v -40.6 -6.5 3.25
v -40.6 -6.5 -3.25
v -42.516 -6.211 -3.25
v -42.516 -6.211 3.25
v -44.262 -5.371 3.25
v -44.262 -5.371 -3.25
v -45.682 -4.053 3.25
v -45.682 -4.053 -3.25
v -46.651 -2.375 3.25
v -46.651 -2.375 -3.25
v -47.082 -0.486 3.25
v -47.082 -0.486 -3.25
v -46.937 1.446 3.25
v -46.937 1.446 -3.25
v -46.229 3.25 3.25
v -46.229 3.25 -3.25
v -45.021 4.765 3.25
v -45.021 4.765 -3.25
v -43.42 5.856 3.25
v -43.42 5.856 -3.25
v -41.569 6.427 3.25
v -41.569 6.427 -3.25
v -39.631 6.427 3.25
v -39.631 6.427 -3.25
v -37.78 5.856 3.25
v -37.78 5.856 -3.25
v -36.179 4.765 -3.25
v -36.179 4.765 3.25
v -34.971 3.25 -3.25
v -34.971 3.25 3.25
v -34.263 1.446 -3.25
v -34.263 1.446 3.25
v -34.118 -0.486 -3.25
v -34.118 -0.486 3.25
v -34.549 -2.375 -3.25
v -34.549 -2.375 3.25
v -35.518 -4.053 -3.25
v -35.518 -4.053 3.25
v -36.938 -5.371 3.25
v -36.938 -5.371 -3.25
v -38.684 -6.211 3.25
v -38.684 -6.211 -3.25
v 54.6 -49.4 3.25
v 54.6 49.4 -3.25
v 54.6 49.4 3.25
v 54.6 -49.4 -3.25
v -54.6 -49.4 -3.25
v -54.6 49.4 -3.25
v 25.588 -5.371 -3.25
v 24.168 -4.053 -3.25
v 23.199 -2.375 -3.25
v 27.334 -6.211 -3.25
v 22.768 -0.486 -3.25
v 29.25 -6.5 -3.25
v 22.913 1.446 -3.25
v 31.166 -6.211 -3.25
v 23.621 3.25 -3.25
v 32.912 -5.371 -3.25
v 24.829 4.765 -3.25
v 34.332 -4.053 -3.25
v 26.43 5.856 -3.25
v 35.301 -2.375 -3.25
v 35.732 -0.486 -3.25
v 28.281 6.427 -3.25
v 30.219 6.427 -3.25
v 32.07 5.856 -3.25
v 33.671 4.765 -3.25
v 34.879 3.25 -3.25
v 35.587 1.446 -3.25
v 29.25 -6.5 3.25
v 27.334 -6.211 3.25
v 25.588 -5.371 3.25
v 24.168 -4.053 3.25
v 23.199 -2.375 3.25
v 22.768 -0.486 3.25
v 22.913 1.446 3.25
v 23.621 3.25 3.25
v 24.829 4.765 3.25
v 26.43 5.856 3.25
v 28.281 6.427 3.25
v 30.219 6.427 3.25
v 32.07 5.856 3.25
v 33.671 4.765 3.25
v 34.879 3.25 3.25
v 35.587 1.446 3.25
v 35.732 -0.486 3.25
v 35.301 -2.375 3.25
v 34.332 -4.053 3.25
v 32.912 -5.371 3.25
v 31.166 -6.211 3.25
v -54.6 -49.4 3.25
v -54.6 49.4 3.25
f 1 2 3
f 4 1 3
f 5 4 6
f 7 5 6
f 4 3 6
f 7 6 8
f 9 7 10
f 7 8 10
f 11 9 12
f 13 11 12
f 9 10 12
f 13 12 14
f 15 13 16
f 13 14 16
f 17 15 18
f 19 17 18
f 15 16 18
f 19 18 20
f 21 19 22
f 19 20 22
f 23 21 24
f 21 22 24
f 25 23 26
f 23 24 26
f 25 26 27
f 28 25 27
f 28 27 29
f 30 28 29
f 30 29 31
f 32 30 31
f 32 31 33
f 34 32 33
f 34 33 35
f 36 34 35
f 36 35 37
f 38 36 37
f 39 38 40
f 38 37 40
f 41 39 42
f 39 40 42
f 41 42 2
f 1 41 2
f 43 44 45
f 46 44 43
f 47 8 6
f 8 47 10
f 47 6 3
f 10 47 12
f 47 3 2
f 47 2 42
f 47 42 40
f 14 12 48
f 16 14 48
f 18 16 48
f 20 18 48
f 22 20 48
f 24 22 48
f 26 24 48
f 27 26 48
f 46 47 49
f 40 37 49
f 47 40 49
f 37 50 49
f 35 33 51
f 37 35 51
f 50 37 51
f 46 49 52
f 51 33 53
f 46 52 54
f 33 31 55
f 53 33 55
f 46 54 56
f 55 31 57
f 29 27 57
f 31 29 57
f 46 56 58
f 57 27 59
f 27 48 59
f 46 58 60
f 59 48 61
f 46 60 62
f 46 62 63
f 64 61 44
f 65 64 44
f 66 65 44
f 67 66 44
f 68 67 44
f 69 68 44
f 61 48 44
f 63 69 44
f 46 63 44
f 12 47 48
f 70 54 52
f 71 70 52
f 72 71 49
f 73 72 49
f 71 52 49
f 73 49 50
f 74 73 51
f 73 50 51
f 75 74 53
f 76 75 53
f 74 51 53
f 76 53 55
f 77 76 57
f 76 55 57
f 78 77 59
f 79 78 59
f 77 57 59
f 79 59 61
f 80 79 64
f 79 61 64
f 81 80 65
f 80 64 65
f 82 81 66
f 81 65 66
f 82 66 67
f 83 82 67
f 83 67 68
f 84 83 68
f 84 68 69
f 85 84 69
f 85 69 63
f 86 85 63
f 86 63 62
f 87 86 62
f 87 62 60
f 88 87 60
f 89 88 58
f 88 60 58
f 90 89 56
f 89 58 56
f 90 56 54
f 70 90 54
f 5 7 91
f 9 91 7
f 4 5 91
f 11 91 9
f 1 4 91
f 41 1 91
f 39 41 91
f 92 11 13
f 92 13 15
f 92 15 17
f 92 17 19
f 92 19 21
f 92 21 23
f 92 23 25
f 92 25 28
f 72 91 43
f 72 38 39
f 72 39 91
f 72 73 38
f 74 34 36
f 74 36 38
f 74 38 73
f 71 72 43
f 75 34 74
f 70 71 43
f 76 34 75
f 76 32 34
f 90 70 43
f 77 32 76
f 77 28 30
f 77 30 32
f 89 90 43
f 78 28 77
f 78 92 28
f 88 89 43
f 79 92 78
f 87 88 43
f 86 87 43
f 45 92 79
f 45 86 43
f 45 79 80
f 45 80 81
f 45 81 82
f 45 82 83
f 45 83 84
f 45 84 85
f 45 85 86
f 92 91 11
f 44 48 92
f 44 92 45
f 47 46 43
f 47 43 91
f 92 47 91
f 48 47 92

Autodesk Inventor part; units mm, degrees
ref_plane "YZ Plane" through (0, 0, 0) normal (1, 0, 0) x (0, 1, 0)
ref_plane "XZ Plane" through (0, 0, 0) normal (0, 1, 0) x (-1, 0, 0)
ref_plane "XY Plane" through (0, 0, 0) normal (0, 0, 1) x (1, 0, 0)
sketch "Sketch1" plane through (0, 0, 0) normal (0, 0, 1) x (1, 0, 0)
  line L0 (-54.6, 49.4) -> (54.6, 49.4)
  line L1 (54.6, 49.4) -> (54.6, -49.4)
  line L2 (54.6, -49.4) -> (-54.6, -49.4)
  line L3 (-54.6, -49.4) -> (-54.6, 49.4)
  line L4 (-54.6, 49.4) -> (54.6, -49.4) construction
  line L5 (54.6, 49.4) -> (-54.6, -49.4) construction
  point P0 (0, 0)
  dimension "Comp" = 109.2
  dimension "Larg" = 98.8
extrude "Extrusion1" add sketch "Sketch1" along normal mid plane 6.5
hole "Hole2" at (-40.6, 0, 3.25) direction (0, 0, -1) diameter 13 end through all
hole "Hole3" at (29.25, 0, 3.25) direction (0, 0, -1) diameter 13 end through all
properties part number "Buste3-2"
